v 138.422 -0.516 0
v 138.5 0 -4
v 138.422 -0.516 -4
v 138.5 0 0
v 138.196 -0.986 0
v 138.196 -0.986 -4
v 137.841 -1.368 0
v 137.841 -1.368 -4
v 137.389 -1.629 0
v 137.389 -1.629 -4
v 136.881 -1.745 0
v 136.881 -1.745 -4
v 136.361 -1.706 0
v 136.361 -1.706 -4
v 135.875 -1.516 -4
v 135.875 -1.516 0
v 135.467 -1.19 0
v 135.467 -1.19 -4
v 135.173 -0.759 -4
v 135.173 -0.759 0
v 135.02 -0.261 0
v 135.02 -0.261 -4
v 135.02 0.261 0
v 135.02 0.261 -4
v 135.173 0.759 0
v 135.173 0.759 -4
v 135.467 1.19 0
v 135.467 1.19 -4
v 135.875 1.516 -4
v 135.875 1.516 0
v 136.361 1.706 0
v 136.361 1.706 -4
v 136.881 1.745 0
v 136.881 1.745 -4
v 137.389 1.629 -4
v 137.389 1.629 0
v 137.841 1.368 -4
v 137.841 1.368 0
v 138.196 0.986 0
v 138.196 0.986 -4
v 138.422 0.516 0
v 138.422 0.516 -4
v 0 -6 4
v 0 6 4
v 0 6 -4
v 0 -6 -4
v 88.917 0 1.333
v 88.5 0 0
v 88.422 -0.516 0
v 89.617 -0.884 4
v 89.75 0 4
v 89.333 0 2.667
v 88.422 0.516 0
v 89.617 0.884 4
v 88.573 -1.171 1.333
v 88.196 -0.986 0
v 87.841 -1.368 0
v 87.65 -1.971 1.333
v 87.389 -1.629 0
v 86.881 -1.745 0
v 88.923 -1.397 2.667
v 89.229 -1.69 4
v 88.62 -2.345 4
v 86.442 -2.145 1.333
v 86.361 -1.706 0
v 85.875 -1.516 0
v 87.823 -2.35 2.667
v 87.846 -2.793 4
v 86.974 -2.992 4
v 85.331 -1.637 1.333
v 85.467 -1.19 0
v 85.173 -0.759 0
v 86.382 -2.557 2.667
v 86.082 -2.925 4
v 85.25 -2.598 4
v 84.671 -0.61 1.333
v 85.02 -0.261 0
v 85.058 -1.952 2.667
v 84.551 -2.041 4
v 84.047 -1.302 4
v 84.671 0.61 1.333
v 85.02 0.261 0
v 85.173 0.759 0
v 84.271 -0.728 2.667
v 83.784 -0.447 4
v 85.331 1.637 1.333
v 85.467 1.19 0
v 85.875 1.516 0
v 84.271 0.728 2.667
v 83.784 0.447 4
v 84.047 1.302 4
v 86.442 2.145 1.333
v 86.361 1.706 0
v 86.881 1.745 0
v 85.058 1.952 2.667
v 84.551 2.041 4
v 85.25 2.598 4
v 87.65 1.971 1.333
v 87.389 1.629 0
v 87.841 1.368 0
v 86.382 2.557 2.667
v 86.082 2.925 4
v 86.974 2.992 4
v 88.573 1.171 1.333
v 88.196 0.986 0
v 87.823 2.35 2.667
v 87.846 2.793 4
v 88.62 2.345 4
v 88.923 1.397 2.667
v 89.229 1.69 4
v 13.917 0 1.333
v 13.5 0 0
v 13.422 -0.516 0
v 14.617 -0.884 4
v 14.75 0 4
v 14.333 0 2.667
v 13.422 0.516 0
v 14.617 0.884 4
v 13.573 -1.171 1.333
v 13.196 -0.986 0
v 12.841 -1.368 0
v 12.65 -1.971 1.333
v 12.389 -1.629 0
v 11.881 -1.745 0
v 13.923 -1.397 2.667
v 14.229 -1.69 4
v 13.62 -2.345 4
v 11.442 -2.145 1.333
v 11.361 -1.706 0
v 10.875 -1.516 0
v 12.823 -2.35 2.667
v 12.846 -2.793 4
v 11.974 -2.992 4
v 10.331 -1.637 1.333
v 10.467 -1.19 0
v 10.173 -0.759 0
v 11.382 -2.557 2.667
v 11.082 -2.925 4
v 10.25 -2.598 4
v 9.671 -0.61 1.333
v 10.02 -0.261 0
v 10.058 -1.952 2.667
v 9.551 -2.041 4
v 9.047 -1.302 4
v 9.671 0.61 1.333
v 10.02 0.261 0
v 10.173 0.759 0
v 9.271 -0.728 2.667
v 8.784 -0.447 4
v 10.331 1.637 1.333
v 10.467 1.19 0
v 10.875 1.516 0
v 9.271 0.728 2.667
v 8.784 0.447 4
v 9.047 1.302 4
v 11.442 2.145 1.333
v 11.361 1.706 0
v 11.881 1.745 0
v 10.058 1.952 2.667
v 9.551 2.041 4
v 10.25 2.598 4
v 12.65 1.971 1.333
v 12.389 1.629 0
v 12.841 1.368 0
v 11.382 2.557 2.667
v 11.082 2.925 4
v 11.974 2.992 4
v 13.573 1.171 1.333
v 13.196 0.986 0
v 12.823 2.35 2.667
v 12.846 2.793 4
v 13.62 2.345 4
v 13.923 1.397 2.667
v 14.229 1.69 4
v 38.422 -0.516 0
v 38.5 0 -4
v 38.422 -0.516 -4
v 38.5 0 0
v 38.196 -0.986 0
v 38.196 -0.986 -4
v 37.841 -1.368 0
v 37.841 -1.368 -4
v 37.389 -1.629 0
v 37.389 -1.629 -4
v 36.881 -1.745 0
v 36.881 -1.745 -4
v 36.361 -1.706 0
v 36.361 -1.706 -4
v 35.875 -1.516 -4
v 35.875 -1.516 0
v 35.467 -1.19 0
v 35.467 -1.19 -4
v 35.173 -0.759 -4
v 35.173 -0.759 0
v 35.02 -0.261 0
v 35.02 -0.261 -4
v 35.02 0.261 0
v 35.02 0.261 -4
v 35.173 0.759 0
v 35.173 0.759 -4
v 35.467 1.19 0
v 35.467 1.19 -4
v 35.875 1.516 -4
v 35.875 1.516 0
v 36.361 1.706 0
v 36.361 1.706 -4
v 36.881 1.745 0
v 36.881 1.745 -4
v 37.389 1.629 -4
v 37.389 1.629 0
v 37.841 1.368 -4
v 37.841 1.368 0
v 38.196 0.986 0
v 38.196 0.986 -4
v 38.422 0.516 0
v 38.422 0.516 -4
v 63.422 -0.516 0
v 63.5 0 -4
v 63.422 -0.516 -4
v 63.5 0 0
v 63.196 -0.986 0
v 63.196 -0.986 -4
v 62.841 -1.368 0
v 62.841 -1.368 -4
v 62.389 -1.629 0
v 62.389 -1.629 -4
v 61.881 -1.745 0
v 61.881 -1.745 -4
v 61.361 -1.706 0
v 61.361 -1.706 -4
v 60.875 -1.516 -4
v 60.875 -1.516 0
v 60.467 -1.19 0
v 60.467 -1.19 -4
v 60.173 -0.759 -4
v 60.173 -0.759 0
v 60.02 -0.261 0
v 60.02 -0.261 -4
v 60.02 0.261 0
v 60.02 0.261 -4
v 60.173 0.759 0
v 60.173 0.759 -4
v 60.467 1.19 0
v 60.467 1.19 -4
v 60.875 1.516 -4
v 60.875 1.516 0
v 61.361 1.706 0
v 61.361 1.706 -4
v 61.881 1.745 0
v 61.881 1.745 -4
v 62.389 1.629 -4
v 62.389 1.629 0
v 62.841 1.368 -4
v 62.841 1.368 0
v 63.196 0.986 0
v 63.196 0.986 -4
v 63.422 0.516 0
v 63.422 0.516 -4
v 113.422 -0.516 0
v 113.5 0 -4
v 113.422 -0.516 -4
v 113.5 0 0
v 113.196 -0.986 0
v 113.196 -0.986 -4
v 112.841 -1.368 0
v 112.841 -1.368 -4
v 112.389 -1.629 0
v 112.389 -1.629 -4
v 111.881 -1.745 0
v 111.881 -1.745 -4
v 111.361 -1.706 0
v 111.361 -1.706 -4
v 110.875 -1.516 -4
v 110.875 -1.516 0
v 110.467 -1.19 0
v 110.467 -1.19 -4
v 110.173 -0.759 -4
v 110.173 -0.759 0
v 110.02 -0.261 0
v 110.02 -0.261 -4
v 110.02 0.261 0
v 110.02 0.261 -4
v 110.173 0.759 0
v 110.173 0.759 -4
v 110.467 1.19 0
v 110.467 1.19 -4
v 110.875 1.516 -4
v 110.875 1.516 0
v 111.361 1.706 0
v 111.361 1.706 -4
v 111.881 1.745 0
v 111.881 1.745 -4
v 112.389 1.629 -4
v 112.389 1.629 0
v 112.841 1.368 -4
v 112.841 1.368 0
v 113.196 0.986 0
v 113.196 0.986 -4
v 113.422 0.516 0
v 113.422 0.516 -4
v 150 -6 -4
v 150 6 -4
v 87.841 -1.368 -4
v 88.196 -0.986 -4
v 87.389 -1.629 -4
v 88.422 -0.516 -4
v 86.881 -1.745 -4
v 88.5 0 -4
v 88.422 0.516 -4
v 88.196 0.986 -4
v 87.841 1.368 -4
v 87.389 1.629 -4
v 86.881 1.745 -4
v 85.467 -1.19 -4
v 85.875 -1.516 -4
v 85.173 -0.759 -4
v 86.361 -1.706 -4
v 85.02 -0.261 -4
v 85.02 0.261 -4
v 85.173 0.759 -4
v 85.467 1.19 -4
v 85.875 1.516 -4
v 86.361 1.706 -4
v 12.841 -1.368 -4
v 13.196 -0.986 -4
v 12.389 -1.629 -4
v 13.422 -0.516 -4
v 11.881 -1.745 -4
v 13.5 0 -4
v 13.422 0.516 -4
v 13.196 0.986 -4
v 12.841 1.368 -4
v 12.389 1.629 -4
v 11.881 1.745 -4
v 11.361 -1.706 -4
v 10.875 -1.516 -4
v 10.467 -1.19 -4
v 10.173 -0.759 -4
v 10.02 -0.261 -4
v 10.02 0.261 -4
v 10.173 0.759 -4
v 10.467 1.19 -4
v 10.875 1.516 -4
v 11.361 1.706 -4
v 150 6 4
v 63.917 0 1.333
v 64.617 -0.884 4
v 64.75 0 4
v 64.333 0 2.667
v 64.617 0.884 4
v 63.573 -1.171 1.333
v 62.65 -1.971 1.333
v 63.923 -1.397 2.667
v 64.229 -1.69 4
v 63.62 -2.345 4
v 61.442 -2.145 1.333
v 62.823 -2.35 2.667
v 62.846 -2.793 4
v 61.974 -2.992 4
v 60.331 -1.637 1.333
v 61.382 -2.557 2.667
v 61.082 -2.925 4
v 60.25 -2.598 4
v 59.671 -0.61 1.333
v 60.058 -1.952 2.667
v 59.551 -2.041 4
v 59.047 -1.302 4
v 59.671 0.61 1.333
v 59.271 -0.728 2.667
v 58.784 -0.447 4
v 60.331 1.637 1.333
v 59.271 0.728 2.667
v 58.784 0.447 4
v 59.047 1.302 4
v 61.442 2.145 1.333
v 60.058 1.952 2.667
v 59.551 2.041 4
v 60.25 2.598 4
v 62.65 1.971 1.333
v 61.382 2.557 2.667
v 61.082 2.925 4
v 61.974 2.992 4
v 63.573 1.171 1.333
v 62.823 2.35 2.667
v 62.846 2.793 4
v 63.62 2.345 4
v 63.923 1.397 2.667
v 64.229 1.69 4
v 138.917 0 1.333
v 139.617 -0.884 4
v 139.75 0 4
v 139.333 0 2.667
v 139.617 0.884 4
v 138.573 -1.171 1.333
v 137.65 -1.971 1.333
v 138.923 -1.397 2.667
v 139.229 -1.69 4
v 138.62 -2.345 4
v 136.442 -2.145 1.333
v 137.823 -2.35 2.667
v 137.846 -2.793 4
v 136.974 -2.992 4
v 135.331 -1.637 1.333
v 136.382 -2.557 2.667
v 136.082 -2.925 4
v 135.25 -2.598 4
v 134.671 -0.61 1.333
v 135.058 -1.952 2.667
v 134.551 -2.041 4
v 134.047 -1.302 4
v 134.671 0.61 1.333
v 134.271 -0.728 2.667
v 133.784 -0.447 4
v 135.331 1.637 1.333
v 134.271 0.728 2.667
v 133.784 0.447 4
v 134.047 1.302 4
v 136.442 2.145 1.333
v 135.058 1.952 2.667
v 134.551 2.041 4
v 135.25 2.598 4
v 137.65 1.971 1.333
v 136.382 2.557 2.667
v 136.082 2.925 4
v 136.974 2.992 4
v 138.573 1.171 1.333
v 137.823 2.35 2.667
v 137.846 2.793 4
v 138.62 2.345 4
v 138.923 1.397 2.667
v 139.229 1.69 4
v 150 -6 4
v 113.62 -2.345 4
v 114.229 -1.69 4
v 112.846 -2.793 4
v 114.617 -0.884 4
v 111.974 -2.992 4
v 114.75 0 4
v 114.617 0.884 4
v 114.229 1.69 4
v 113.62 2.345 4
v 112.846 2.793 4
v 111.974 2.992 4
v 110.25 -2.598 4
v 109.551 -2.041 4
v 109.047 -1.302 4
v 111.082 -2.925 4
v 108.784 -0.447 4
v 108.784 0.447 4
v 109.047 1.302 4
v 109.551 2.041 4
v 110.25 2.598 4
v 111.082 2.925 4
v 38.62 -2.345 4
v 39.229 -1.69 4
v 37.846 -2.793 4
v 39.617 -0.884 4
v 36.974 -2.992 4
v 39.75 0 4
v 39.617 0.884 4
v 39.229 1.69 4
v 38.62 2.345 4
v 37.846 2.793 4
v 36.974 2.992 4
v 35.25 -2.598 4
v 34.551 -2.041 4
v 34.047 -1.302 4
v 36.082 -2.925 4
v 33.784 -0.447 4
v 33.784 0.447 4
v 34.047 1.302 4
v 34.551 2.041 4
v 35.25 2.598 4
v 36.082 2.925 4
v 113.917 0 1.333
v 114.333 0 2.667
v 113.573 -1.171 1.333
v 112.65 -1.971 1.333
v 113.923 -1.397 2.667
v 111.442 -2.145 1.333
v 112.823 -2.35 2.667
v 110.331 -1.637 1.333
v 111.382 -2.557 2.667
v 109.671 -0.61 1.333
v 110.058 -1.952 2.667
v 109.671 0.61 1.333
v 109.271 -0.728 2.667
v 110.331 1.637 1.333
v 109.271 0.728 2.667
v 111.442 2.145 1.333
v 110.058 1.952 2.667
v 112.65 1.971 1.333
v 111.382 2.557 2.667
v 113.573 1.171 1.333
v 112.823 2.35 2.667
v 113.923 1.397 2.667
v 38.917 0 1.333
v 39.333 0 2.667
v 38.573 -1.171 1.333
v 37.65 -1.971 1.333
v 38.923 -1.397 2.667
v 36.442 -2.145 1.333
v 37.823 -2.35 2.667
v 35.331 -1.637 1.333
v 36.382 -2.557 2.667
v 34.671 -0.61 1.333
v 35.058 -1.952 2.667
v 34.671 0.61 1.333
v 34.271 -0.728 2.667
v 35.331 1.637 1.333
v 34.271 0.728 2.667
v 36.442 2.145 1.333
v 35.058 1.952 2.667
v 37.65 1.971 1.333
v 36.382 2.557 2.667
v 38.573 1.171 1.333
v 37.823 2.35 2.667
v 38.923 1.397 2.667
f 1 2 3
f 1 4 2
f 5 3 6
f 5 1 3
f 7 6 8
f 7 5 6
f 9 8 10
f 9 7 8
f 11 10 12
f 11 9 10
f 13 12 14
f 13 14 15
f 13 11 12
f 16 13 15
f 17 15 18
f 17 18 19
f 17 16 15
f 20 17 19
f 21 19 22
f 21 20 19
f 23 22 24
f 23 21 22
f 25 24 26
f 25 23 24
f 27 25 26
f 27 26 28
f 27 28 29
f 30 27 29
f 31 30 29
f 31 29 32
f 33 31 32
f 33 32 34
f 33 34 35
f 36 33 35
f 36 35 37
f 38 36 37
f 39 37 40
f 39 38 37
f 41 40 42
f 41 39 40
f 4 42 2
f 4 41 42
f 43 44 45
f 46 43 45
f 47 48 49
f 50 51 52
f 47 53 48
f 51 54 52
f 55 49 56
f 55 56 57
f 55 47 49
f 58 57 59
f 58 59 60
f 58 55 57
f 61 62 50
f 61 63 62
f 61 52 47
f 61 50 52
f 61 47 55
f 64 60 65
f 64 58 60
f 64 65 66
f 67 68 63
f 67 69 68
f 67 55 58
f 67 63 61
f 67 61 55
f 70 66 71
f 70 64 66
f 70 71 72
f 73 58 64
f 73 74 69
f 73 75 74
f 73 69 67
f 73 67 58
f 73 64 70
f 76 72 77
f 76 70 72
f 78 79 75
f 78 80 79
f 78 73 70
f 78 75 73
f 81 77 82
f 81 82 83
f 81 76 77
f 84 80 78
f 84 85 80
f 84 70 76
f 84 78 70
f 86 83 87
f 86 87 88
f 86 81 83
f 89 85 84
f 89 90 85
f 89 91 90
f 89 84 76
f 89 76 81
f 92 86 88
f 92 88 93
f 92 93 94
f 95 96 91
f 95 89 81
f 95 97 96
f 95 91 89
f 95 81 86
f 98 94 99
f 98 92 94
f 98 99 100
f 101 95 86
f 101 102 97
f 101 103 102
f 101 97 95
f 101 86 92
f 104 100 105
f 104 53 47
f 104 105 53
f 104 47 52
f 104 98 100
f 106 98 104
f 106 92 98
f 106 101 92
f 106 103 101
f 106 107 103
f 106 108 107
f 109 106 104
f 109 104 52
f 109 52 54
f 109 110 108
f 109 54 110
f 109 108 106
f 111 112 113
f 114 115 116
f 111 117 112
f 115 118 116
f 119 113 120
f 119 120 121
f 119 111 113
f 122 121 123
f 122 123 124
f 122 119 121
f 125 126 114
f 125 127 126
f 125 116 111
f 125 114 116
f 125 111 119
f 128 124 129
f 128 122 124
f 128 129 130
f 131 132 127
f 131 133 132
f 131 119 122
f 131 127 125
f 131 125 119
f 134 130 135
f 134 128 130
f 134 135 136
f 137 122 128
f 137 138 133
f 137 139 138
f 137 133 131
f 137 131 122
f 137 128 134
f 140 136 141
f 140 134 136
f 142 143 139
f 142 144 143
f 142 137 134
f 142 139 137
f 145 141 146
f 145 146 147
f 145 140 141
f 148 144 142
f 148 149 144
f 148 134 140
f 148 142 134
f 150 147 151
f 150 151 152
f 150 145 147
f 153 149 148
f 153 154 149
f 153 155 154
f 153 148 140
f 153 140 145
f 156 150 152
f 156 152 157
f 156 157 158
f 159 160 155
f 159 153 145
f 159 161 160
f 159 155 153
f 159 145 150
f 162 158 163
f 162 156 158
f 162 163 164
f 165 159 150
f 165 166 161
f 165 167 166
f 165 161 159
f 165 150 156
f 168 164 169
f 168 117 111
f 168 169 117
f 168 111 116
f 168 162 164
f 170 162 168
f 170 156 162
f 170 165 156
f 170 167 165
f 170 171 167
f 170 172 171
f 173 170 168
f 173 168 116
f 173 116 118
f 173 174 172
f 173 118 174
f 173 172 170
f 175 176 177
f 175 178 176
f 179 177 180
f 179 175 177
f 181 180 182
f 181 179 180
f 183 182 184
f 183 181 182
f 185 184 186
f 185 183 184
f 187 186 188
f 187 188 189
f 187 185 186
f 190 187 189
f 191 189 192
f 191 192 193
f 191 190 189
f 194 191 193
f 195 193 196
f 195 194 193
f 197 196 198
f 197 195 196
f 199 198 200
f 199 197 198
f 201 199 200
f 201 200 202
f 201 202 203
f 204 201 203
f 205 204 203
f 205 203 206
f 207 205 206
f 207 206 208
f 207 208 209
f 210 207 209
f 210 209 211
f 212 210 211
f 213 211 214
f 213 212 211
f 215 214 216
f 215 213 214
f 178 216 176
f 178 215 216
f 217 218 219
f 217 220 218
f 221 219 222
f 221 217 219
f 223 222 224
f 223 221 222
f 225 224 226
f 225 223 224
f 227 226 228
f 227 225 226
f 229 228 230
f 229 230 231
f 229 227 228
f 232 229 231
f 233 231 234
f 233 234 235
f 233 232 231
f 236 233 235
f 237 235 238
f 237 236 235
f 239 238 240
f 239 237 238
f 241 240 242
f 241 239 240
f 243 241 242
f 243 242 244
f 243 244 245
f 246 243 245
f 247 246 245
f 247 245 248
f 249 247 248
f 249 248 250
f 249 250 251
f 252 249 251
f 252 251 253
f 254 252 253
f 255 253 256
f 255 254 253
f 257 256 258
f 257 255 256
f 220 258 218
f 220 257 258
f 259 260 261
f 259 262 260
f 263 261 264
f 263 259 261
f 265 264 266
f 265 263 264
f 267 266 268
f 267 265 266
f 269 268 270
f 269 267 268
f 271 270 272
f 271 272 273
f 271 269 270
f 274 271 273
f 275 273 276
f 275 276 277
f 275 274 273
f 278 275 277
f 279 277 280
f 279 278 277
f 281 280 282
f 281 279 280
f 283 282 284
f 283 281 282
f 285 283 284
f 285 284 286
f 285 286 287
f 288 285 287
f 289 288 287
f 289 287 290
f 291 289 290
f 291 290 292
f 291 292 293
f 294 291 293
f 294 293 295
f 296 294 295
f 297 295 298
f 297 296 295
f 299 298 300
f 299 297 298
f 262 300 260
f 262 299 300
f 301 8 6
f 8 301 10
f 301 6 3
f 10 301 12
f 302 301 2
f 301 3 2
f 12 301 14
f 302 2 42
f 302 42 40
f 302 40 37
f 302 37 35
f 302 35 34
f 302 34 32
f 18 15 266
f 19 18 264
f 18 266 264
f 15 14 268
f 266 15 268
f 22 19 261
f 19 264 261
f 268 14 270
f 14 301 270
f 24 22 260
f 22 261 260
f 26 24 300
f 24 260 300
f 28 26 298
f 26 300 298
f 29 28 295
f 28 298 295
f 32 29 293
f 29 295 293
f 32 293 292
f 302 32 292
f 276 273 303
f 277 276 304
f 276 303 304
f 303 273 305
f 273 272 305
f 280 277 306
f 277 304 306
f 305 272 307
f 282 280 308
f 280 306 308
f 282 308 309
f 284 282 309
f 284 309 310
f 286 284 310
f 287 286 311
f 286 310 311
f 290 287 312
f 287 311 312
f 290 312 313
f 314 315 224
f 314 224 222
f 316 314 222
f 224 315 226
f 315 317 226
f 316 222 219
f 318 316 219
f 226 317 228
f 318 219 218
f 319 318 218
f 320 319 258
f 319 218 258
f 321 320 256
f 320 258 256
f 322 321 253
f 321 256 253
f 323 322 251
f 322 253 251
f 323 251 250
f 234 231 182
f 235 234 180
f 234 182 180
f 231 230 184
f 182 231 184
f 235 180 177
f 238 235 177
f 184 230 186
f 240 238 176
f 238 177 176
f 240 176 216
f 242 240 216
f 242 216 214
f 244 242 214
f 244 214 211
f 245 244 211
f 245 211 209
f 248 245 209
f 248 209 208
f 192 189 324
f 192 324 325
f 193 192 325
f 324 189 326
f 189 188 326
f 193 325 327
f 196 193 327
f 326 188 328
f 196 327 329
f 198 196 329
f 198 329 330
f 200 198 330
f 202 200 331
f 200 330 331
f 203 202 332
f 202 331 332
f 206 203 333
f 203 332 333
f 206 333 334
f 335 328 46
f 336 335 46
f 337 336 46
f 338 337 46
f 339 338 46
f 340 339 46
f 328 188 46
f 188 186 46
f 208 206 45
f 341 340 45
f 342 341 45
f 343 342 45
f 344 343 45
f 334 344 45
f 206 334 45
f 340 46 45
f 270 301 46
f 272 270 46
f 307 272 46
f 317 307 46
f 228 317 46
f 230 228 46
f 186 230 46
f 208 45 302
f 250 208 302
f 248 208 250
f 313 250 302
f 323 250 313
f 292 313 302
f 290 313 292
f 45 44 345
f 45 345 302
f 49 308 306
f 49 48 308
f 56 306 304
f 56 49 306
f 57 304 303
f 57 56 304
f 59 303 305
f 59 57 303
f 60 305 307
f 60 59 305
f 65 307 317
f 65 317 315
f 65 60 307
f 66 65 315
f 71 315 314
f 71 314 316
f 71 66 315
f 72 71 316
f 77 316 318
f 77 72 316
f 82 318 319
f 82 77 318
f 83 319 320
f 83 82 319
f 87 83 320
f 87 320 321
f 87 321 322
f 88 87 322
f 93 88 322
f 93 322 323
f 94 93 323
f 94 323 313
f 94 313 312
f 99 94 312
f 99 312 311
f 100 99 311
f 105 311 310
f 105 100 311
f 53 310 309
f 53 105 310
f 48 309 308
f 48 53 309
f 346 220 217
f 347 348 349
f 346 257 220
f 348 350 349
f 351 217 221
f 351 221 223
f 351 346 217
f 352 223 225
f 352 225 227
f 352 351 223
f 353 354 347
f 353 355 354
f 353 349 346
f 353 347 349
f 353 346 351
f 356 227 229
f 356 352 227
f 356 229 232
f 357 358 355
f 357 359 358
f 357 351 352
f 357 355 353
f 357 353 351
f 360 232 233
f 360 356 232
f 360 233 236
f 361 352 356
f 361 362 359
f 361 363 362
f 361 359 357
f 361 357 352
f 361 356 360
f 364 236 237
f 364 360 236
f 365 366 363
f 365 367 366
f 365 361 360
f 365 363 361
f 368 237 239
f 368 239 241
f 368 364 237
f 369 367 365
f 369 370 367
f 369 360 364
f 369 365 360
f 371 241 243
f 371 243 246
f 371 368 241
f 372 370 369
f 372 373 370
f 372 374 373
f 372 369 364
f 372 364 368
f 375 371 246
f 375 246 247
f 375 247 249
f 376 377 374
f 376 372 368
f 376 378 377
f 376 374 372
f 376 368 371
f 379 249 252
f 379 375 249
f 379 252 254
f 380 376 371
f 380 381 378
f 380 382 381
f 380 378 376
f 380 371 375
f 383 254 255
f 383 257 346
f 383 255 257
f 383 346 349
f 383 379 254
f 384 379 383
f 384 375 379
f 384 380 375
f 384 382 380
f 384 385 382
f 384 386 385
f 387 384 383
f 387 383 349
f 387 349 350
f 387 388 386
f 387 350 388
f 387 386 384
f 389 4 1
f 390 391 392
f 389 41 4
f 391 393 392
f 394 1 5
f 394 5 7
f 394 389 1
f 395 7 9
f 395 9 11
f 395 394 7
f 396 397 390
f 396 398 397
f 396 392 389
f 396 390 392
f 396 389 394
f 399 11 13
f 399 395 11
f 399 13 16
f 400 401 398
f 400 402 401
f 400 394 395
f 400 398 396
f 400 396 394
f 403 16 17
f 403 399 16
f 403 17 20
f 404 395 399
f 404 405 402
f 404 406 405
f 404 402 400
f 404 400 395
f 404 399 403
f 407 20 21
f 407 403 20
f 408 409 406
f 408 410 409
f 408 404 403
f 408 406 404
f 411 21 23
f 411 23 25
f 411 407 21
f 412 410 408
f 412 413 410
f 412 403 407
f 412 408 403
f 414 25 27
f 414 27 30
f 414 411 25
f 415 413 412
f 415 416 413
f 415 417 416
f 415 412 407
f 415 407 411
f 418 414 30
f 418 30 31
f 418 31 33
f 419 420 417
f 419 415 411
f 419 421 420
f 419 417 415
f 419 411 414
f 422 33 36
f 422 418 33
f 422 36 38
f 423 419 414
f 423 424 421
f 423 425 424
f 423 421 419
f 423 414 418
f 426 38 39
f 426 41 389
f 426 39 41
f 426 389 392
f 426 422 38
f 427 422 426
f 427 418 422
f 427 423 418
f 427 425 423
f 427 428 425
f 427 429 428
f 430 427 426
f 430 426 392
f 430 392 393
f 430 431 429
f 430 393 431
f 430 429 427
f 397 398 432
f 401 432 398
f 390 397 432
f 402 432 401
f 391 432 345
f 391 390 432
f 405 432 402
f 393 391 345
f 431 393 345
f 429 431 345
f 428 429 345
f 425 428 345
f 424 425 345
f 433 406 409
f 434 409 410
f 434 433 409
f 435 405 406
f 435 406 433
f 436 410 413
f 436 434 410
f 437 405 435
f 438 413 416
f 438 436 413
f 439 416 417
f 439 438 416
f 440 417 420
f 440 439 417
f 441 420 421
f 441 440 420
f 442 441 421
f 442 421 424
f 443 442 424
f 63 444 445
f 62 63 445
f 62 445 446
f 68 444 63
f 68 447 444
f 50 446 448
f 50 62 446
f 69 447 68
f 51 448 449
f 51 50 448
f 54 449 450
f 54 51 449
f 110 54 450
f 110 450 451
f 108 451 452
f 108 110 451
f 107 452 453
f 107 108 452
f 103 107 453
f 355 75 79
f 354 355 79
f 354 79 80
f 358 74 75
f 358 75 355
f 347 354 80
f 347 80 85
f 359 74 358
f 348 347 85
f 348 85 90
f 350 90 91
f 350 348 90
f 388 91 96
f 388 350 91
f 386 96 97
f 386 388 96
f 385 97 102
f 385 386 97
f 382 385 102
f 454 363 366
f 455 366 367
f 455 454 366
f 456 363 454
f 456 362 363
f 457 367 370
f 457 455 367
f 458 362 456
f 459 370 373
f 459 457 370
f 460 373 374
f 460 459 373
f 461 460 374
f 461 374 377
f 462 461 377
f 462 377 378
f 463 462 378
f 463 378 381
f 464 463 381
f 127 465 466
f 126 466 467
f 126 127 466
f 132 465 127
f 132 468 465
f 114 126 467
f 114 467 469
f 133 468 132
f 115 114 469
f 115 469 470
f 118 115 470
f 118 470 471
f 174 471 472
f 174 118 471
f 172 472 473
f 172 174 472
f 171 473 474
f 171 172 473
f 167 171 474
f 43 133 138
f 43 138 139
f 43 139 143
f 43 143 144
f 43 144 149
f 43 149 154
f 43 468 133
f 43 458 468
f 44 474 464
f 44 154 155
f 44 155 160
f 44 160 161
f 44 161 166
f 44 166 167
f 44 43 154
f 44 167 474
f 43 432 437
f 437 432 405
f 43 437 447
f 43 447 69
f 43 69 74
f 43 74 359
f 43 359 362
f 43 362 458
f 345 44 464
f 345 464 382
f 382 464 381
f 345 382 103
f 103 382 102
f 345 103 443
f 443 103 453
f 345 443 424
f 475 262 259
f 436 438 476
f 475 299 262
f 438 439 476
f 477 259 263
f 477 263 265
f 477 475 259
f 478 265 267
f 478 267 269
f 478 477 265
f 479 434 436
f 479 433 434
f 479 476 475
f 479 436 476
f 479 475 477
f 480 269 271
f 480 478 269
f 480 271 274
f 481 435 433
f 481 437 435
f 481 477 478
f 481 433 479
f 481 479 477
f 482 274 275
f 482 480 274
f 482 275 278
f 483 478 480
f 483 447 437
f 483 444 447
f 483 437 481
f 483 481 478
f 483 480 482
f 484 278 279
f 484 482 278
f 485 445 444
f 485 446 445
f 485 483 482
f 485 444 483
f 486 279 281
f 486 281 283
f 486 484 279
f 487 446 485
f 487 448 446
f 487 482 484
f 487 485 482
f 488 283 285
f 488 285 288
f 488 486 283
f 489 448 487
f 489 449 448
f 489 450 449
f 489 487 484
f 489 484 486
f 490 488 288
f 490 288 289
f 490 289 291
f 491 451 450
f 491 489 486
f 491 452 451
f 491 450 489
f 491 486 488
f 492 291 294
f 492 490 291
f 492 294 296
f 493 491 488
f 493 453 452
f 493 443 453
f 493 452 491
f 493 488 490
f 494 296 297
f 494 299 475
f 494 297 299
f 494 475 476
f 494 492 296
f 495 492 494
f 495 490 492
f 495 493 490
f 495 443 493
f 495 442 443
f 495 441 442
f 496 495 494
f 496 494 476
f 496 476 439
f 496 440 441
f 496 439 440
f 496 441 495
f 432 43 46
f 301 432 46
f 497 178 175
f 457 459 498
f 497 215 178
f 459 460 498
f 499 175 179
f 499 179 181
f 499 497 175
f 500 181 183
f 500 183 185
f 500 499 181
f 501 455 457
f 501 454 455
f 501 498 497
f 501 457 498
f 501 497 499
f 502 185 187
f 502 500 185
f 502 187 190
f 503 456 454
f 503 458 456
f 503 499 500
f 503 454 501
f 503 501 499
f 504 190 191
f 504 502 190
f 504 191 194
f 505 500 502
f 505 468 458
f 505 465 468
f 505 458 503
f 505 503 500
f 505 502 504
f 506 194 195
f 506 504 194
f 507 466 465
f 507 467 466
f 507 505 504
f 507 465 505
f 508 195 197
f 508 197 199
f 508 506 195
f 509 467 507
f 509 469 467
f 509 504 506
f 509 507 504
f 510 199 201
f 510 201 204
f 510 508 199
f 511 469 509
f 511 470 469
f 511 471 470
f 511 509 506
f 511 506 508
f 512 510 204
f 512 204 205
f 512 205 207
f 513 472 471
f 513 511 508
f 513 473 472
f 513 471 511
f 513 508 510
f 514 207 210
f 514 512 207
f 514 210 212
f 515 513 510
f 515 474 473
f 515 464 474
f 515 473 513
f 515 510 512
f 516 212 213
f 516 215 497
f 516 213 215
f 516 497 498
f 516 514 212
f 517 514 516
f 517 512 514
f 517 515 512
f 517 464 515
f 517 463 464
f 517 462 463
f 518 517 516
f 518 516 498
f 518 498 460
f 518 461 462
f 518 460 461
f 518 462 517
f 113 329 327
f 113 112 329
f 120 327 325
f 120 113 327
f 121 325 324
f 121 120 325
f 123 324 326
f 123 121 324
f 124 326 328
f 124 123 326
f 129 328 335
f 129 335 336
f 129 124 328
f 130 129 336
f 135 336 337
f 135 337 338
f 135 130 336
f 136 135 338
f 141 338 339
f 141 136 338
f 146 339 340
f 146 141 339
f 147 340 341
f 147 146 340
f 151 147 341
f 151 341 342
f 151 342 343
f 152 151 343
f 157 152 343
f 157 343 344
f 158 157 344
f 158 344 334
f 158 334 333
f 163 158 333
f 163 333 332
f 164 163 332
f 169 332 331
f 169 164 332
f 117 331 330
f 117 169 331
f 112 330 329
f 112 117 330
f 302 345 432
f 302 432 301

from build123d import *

# Parameters (mm, degrees)
SKETCH1_W           = 8
SKETCH1_H           = 12
BOSS_EXTRUDE1_DEPTH = 150
LPATTERN1_COUNT     = 6
LPATTERN1_PITCH     = 25


with BuildPart() as part:
    # Sketch1 → Boss-Extrude1 (new body)
    with BuildSketch(Plane(origin=(0, 0, 0), x_dir=(0, 0, -1), z_dir=(1, 0, 0))):
        Rectangle(SKETCH1_W, SKETCH1_H)
    extrude(amount=BOSS_EXTRUDE1_DEPTH)

    # Sketch4 → Cut-Revolve1 (revolve, cut)
    with BuildSketch(Plane.ZY.offset(-11.75), mode=Mode.PRIVATE) as cut_revolve1_sk:
        Polygon((4, 0), (-4, 0), (-4, -1.75), (0, -1.75), (4, -3), align=None)
    cut_revolve1 = revolve(cut_revolve1_sk.sketch.rotate(Axis((11.75, 0, 4), (0, 0, -1)), 270), axis=Axis((11.75, 0, 4), (0, 0, -1)), mode=Mode.SUBTRACT)

    # LPattern1: Cut-Revolve1 ×6
    with Locations(*[(i * LPATTERN1_PITCH, 0, 0) for i in range(1, LPATTERN1_COUNT)]):
        add(cut_revolve1, mode=Mode.SUBTRACT)


solid = part.part
